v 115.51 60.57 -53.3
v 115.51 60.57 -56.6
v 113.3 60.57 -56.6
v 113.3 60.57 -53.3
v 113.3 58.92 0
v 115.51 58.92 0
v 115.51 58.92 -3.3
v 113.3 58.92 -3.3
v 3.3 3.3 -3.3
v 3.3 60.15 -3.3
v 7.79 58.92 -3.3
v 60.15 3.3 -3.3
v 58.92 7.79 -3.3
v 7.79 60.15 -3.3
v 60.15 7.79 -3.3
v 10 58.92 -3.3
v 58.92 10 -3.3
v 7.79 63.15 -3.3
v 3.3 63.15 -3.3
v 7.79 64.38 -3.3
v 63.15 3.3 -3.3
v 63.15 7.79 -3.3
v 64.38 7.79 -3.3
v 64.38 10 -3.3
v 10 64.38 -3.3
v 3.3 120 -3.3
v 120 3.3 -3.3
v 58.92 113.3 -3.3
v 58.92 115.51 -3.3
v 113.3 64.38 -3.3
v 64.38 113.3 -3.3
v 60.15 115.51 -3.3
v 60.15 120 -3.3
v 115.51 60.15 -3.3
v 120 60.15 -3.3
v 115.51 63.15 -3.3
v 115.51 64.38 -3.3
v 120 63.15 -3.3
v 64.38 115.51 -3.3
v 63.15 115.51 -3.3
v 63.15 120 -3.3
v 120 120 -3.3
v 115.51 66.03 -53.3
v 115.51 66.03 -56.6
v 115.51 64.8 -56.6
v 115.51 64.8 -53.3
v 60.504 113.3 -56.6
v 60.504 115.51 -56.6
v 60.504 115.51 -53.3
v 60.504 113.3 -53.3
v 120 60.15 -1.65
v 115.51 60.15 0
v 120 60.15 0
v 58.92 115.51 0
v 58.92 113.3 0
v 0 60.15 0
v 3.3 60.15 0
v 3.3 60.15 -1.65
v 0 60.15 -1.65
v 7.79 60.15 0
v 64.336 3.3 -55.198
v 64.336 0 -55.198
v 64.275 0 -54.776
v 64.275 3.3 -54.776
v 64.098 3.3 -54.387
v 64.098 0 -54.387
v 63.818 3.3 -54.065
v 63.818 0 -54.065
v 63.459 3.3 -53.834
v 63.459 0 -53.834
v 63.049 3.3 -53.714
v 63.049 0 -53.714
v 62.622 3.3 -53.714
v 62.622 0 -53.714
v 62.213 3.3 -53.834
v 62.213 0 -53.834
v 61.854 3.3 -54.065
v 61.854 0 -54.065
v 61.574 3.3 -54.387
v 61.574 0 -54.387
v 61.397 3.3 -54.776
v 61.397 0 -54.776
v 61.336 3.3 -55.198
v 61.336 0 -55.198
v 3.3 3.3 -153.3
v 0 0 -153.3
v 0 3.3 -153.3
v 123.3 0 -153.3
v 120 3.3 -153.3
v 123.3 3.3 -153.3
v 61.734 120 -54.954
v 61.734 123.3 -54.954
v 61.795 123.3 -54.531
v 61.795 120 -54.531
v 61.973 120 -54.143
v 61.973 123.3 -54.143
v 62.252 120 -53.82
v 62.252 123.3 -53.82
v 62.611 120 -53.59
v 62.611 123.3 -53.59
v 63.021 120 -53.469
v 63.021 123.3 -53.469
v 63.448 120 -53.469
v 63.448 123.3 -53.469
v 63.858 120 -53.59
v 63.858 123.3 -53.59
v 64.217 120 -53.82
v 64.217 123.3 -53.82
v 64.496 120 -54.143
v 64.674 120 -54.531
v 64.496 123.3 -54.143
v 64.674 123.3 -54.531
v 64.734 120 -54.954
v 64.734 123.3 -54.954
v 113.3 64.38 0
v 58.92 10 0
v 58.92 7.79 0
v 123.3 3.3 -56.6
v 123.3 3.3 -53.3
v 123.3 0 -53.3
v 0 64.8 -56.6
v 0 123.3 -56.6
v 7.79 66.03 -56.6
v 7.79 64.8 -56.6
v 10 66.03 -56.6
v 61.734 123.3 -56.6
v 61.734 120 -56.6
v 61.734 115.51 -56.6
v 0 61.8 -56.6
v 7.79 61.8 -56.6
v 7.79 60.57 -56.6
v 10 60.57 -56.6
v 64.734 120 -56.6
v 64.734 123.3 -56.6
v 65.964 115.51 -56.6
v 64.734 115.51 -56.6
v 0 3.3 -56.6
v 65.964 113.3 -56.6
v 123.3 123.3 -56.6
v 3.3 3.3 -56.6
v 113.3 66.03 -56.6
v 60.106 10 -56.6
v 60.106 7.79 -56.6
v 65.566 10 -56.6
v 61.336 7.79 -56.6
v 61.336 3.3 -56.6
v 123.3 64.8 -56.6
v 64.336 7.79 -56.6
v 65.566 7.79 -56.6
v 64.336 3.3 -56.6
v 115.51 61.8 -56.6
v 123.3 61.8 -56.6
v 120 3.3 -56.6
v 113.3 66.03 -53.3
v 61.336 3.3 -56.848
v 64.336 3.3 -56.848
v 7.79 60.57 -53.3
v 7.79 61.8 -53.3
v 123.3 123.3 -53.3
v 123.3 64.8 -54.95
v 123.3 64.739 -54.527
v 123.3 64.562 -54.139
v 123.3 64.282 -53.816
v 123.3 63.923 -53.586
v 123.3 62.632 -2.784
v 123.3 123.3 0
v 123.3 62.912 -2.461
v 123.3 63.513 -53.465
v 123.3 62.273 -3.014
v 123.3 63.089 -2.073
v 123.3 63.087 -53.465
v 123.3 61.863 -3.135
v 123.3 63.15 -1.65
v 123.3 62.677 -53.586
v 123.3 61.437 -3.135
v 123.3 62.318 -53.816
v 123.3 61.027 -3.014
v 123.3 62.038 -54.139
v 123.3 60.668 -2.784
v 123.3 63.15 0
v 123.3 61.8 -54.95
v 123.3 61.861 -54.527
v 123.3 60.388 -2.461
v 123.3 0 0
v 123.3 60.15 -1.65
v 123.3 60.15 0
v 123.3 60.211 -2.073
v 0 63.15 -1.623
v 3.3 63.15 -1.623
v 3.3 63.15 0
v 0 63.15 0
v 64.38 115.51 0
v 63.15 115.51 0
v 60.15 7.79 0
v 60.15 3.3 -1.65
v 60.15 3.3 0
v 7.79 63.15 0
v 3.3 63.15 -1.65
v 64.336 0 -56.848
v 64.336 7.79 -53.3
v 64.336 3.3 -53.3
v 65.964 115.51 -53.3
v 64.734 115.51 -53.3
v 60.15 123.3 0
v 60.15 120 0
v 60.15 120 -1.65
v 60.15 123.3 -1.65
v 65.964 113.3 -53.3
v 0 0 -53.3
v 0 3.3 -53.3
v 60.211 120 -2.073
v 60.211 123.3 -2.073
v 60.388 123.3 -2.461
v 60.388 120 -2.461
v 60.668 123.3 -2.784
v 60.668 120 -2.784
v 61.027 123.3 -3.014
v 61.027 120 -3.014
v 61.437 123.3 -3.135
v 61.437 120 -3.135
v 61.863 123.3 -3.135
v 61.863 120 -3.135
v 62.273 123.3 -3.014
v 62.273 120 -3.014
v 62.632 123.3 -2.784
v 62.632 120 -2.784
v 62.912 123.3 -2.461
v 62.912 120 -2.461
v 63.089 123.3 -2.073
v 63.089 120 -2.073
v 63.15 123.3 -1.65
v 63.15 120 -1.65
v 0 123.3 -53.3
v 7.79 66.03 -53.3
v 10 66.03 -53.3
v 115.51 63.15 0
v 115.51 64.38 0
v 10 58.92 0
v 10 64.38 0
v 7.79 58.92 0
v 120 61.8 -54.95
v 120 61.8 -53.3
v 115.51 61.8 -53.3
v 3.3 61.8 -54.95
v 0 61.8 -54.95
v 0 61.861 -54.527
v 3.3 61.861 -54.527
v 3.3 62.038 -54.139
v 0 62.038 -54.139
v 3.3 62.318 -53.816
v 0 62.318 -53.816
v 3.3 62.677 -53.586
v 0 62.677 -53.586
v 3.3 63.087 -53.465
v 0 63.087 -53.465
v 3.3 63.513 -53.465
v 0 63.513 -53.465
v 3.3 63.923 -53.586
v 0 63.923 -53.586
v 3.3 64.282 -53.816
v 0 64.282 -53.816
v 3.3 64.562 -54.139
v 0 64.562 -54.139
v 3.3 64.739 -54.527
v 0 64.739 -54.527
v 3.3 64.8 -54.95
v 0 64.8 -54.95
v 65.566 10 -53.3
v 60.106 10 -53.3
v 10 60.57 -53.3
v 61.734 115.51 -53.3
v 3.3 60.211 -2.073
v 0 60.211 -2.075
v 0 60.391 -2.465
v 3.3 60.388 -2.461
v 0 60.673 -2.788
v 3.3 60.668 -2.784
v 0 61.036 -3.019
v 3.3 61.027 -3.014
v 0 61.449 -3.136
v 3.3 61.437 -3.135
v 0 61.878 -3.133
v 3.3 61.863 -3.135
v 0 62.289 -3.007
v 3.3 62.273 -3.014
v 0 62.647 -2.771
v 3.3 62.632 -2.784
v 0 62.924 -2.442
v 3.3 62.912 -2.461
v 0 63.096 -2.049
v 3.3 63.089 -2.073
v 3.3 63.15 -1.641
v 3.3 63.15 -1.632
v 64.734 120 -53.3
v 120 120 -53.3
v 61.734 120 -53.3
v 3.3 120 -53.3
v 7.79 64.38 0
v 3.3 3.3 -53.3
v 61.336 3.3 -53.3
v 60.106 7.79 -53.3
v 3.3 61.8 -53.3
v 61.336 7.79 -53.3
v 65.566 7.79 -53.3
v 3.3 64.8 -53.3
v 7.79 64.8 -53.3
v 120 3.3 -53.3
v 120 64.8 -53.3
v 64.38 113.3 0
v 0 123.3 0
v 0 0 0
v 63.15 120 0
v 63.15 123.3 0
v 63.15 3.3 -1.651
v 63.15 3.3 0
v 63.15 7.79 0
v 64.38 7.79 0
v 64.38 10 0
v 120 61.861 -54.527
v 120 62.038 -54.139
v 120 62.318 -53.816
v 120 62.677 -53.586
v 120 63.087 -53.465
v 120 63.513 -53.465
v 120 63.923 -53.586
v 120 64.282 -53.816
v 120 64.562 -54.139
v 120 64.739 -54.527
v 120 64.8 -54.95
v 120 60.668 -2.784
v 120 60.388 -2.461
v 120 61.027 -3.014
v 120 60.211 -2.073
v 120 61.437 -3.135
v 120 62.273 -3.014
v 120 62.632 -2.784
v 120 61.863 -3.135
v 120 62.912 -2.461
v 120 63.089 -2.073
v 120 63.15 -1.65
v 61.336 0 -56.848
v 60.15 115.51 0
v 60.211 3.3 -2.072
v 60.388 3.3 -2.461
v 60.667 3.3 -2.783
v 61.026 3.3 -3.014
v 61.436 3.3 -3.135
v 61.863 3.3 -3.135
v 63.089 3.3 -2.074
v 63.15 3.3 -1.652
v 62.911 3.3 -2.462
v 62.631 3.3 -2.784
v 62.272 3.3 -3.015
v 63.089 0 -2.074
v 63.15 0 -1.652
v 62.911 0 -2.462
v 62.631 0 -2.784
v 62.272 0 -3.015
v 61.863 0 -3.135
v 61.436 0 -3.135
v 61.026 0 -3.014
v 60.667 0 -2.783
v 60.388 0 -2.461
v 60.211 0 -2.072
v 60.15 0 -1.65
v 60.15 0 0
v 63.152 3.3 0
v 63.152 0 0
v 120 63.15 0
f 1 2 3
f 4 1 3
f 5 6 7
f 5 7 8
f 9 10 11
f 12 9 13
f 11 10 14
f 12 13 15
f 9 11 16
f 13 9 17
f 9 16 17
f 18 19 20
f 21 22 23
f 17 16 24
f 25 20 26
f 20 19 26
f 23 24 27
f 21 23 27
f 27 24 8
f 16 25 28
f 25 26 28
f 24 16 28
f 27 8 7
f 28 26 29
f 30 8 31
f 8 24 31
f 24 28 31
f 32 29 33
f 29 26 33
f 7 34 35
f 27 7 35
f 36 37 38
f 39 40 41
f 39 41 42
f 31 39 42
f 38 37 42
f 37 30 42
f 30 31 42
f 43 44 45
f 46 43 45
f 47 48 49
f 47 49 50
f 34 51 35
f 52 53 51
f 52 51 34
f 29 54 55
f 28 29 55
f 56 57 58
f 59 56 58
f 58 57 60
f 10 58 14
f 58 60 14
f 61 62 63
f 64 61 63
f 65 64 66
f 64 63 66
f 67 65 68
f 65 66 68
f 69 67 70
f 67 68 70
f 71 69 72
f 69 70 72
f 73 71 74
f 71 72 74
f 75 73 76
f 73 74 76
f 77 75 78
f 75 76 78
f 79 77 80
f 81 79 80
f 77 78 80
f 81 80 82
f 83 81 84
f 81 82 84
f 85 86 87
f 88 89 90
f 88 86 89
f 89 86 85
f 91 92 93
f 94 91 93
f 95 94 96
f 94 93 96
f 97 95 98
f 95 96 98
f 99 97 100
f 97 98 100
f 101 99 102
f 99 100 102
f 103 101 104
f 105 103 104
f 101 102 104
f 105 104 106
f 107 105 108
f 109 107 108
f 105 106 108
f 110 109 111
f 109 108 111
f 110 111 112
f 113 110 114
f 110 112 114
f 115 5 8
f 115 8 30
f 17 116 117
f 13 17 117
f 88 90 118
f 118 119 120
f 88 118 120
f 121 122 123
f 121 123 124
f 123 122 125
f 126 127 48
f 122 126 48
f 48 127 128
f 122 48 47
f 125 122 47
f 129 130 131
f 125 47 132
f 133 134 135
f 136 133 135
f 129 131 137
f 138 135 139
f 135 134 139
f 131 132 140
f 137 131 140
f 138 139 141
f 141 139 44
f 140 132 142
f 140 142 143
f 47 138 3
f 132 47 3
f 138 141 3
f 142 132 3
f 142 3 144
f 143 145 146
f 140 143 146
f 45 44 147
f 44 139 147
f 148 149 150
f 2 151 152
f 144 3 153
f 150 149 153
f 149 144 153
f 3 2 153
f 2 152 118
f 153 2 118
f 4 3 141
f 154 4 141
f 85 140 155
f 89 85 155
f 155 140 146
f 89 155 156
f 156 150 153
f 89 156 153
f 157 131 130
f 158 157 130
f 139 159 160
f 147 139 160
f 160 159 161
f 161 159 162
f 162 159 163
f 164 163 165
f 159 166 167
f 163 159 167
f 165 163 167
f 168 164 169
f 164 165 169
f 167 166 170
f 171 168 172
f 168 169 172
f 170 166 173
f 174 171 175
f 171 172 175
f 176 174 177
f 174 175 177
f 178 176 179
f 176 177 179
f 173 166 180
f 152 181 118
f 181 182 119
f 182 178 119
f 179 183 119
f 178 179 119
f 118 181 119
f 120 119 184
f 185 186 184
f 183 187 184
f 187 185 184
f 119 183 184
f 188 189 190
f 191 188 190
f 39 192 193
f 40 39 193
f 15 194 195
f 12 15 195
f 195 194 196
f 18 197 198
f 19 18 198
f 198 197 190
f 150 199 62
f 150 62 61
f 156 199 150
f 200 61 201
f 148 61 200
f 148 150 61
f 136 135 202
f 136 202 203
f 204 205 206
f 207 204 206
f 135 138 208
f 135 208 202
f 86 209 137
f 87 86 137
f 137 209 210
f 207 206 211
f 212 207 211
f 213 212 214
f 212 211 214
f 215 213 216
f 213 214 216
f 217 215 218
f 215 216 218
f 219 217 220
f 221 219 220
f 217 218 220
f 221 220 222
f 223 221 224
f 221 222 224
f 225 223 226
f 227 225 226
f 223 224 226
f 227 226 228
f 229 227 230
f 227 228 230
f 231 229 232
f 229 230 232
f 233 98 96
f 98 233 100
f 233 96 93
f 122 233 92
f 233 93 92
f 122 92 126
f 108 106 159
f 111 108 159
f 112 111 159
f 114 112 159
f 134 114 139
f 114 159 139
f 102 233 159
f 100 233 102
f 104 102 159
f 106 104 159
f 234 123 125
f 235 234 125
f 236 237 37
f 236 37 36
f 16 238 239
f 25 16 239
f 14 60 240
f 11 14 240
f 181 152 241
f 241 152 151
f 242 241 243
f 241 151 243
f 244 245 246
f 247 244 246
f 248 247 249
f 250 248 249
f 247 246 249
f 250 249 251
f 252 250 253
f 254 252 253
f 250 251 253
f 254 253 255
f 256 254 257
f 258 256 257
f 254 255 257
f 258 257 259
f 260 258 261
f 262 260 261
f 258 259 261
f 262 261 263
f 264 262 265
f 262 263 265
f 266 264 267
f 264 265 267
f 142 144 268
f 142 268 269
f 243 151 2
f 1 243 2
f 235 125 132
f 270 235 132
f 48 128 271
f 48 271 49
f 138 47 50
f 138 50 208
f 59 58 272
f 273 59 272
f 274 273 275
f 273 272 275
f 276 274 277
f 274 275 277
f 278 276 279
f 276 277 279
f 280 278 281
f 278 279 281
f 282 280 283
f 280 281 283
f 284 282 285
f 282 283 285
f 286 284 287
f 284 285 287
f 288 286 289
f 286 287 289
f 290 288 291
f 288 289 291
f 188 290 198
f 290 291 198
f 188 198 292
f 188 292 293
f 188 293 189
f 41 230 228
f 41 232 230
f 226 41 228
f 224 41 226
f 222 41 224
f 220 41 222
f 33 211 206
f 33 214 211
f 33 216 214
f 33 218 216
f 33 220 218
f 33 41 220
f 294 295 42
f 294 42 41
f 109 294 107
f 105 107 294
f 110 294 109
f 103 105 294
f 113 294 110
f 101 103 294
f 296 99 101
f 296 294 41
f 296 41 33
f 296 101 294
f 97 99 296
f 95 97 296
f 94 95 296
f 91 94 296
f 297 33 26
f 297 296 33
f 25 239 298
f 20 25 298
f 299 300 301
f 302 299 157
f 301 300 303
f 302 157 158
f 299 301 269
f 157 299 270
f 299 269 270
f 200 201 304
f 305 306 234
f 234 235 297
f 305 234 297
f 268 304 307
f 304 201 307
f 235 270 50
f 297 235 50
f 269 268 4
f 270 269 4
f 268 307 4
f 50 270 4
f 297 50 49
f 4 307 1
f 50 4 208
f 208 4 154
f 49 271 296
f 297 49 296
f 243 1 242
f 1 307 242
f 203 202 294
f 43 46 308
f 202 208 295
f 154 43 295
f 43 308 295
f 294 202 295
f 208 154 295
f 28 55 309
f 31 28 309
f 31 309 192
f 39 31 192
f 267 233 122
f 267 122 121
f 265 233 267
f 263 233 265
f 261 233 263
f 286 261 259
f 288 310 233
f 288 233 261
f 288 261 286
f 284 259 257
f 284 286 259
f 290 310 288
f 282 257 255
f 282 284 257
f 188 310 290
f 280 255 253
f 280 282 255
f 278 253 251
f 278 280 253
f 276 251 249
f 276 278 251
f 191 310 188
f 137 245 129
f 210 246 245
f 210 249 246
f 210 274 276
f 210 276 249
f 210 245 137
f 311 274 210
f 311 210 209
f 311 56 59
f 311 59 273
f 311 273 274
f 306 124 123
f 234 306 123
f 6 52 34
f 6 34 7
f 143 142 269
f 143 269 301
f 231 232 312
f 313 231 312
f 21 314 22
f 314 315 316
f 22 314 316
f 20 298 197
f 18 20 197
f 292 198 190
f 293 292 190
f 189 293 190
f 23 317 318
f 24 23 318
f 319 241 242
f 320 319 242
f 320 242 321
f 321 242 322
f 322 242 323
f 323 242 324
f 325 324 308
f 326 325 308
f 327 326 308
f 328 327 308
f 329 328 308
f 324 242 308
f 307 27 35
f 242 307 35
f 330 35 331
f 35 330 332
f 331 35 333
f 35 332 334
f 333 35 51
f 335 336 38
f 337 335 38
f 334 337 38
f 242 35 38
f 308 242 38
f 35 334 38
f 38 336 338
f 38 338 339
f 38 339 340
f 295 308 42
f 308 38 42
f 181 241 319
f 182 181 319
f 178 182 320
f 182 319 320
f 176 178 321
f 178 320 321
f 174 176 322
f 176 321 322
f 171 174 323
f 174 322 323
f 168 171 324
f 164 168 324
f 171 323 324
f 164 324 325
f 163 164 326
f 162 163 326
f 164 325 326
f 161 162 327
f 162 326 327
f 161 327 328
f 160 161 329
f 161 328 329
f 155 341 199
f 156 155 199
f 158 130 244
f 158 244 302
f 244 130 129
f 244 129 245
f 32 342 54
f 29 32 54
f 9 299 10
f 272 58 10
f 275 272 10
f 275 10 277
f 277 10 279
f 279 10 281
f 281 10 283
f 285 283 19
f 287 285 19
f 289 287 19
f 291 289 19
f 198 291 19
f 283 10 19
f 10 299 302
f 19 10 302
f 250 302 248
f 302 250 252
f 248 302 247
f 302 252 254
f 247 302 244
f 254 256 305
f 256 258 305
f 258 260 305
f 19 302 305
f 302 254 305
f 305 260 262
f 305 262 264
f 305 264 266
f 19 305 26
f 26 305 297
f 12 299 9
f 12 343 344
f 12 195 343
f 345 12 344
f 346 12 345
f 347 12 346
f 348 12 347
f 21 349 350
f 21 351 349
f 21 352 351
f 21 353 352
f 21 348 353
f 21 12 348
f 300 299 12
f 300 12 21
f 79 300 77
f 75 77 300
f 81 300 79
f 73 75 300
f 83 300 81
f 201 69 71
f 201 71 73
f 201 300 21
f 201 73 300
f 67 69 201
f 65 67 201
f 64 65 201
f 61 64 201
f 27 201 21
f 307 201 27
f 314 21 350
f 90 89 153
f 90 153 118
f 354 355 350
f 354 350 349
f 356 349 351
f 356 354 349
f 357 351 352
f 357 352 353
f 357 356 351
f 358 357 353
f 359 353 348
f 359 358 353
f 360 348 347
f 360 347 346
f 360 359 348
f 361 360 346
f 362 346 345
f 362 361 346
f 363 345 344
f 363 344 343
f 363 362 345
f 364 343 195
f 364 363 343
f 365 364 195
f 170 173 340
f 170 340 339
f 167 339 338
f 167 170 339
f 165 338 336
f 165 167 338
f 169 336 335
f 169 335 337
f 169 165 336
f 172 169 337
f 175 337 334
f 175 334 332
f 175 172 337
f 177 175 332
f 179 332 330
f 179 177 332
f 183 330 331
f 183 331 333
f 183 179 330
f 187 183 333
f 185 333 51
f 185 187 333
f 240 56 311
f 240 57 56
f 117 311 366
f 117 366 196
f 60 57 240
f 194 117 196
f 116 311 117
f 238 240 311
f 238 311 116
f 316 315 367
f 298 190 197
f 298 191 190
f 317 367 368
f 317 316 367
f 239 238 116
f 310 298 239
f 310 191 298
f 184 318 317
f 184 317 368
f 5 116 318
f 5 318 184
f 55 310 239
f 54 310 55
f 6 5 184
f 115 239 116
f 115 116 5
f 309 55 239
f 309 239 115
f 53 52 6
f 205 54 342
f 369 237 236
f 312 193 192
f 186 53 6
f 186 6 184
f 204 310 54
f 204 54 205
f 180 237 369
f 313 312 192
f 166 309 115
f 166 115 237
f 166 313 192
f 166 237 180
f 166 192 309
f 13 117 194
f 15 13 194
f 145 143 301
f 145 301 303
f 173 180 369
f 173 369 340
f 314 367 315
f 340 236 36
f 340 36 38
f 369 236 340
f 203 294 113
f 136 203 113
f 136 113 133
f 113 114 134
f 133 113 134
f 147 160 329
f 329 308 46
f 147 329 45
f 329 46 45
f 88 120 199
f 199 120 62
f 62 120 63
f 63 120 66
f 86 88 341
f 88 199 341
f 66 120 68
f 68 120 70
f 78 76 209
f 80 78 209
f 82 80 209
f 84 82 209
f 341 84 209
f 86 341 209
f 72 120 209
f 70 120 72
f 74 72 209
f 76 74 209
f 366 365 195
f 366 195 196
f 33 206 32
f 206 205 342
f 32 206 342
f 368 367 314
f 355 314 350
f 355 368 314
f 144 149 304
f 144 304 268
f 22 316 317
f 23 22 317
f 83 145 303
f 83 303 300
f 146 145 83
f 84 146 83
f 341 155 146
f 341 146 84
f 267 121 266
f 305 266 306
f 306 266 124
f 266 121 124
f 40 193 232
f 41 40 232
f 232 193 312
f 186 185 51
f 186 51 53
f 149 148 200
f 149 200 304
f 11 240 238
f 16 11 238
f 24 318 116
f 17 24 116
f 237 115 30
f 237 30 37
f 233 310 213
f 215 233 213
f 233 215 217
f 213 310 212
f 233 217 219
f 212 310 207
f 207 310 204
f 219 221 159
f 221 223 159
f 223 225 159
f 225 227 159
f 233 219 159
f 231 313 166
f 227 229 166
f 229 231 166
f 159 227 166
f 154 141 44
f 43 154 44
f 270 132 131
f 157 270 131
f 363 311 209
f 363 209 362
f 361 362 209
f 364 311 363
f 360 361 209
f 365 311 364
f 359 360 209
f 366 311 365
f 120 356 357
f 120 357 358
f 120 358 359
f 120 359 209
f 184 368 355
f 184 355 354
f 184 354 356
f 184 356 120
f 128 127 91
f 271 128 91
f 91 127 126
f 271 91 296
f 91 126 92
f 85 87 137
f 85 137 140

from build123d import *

# Parameters (mm, degrees)
SCHIZZO2_W                   = 123.3
SCHIZZO2_H                   = 123.3
ESTRUSIONE_ESTRUSIONE2_DEPTH = 53.3
SVUOTA1_T                    = -3.3
TAGLIO_ESTRUSIONE2_DEPTH     = 3.3
TAGLIO_ESTRUSIONE6_DEPTH     = 3.3
TAGLIO_ESTRUSIONE7_START     = 3.3
TAGLIO_ESTRUSIONE7_DEPTH     = 3.3
TAGLIO_ESTRUSIONE8_DEPTH     = 3.3
TAGLIO_ESTRUSIONE9_START     = -3.3
TAGLIO_ESTRUSIONE9_DEPTH     = 3.3
ESTRUSIONE_ESTRUSIONE5_DEPTH = 100
ESTRUSIONE_ESTRUSIONE7_DEPTH = 123.3
TAGLIO_ESTRUSIONE19_DEPTH    = 3.3
TAGLIO_ESTRUSIONE20_DEPTH    = 3.3
TAGLIO_ESTRUSIONE21_START    = -3.3
TAGLIO_ESTRUSIONE21_DEPTH    = 3.3
TAGLIO_ESTRUSIONE22_DEPTH    = 3.3
TAGLIO_ESTRUSIONE23_DEPTH    = 3.3
TAGLIO_ESTRUSIONE24_DEPTH    = 3.3


with BuildPart() as part:
    # Schizzo2 → Estrusione-Estrusione2 (new body)
    with BuildSketch(Plane.XY):
        with Locations((61.65, 61.65)):
            Rectangle(SCHIZZO2_W, SCHIZZO2_H)
    extrude(amount=-ESTRUSIONE_ESTRUSIONE2_DEPTH)

    # Svuota1
    svuota1_openings = [part.faces().sort_by_distance(p)[0] for p in [
        (61.65, 61.65, -53.3),
    ]]
    offset(amount=SVUOTA1_T, openings=svuota1_openings, kind=Kind.INTERSECTION)

    # Schizzo3D1 → Taglio-Estrusione2 (cut)
    with BuildSketch(Plane(origin=(123.3, 60.15, -1.65), x_dir=(0, 0.8762159086766463, 0.48191874977215726), z_dir=(1, 0, 0))):
        with BuildLine():
            Line((0, 0), (0.795165937, 1.445756249))
            Line((0.795165937, 1.445756249), (3.423813663, 0))
            Line((3.423813663, 0), (2.628647726, -1.445756249))
            ThreePointArc((2.628647726, -1.445756249), (0.591445738, -2.037201988), (0, 0))
        make_face()
    extrude(amount=-TAGLIO_ESTRUSIONE2_DEPTH, mode=Mode.SUBTRACT)

    # Schizzo6 → Taglio-Estrusione6 (cut)
    with BuildSketch(Plane.XY):
        Polygon((120, 60.15), (115.51, 60.15), (115.51, 58.92), (113.3, 58.92), (113.3, 64.38), (115.51, 64.38), (115.51, 63.15), (120, 63.15), align=None)
        Polygon((3.3, 63.15), (3.3, 60.15), (7.79, 60.15), (7.79, 58.92), (10, 58.92), (10, 64.38), (7.79, 64.38), (7.79, 63.15), align=None)
        Polygon((60.15, 3.3), (63.15, 3.3), (63.15, 7.79), (64.38, 7.79), (64.38, 10), (58.92, 10), (58.92, 7.79), (60.15, 7.79), align=None)
        Polygon((63.15, 120), (60.15, 120), (60.15, 115.51), (58.92, 115.51), (58.92, 113.3), (64.38, 113.3), (64.38, 115.51), (63.15, 115.51), align=None)
    extrude(amount=-TAGLIO_ESTRUSIONE6_DEPTH, mode=Mode.SUBTRACT)

    # Schizzo3D6 → Taglio-Estrusione7 (cut)
    with BuildSketch(Plane(origin=(0, 61.65, 0), x_dir=(0, -0.6726727939963129, -0.7399400733959435), z_dir=(1, 0, 0)).offset(TAGLIO_ESTRUSIONE7_START)):
        with BuildLine():
            Line((0, 0), (1.009009191, -1.10991011))
            Line((1.009009191, -1.10991011), (2.229910312, 0))
            ThreePointArc((2.229910312, 0), (2.321673153, 2.128880637), (0.192052014, 2.201454665))
            Line((0.192052014, 2.201454665), (-1.008845302, 1.109729832))
            Line((-1.008845302, 1.109729832), (0, 0))
        make_face()
    extrude(amount=-TAGLIO_ESTRUSIONE7_DEPTH, mode=Mode.SUBTRACT)

    # Schizzo3D7 → Taglio-Estrusione8 (cut)
    with BuildSketch(Plane(origin=(60.15, 0, 0), x_dir=(0.8760258326495893, 2.026216235651821e-15, -0.48226418126437076), z_dir=(0, -1, 0))):
        with BuildLine():
            Line((0, 0), (2.629562684, 1.447610159))
            Line((2.629562684, 1.447610159), (3.424555643, 0))
            ThreePointArc((3.424555643, 0), (2.832496055, -2.036456397), (0.795735899, -1.445442624))
            Line((0.795735899, -1.445442624), (0, 0))
        make_face()
    extrude(amount=-TAGLIO_ESTRUSIONE8_DEPTH, mode=Mode.SUBTRACT)

    # Schizzo3D8 → Taglio-Estrusione9 (cut)
    with BuildSketch(Plane(origin=(63.15, 123.3, 0), x_dir=(-0.8762159086766472, 0, -0.48191874977215554), z_dir=(0, 1, 0)).offset(TAGLIO_ESTRUSIONE9_START)):
        with BuildLine():
            Line((0, 0), (2.628647726, 1.445756249))
            Line((2.628647726, 1.445756249), (3.423813663, 0))
            ThreePointArc((3.423813663, 0), (2.832367925, -2.037201988), (0.795165937, -1.445756249))
            Line((0.795165937, -1.445756249), (0, 0))
        make_face()
    extrude(amount=TAGLIO_ESTRUSIONE9_DEPTH, mode=Mode.SUBTRACT)

    # Schizzo3D9 → Estrusione-Estrusione5 (add)
    with BuildSketch(Plane(origin=(120, 3.3, -53.3), x_dir=(-0.9996220893327035, -0.02748960745664935, 0), z_dir=(0, 0, 1))):
        Polygon((0, 0), (-3.298752895, 0.090715705), (-3.20803719, 3.389468599), (120.045366425, 0), (119.95465072, -3.298752895), (116.655897825, -3.20803719), align=None)
    extrude(amount=-ESTRUSIONE_ESTRUSIONE5_DEPTH)

    # Schizzo3D10 → Estrusione-Estrusione7 (add)
    with BuildSketch(Plane(origin=(123.3, 123.3, -53.3), x_dir=(0, -0.9996220893327035, -0.027489607456649322), z_dir=(-1, 0, 0))):
        Polygon((0, 0), (0.090715705, -3.298752895), (120.045366425, 0), (119.95465072, 3.298752895), align=None)
    extrude(amount=ESTRUSIONE_ESTRUSIONE7_DEPTH)

    # Schizzo14 → Taglio-Estrusione19 (cut)
    with BuildSketch(Plane.ZY):
        with BuildLine():
            Line((-56.6, 64.8), (-56.6, 61.8))
            Line((-56.6, 61.8), (-54.95, 61.8))
            ThreePointArc((-54.95, 61.8), (-53.45, 63.3), (-54.95, 64.8))
            Line((-54.95, 64.8), (-56.6, 64.8))
        make_face()
    extrude(amount=-TAGLIO_ESTRUSIONE19_DEPTH, mode=Mode.SUBTRACT)

    # Schizzo21 → Taglio-Estrusione20 (cut)
    with BuildSketch(Plane(origin=(0, 0, 0), x_dir=(-1, 0, 0), z_dir=(0, -1, 0))):
        with BuildLine():
            Line((-64.335889046, 56.848416793), (-64.335889046, 55.198416793))
            ThreePointArc((-64.335889046, 55.198416793), (-62.835889046, 53.698416793), (-61.335889046, 55.198416793))
            Line((-61.335889046, 55.198416793), (-61.335889046, 56.848416793))
            Line((-61.335889046, 56.848416793), (-64.335889046, 56.848416793))
        make_face()
    extrude(amount=-TAGLIO_ESTRUSIONE20_DEPTH, mode=Mode.SUBTRACT)

    # Schizzo17 → Taglio-Estrusione21 (cut)
    with BuildSketch(Plane(origin=(123.3, 0, 0), x_dir=(0, 0, -1), z_dir=(1, 0, 0)).offset(TAGLIO_ESTRUSIONE21_START)):
        with BuildLine():
            Line((56.6, 64.8), (56.6, 61.8))
            Line((56.6, 61.8), (54.95, 61.8))
            ThreePointArc((54.95, 61.8), (53.45, 63.3), (54.95, 64.8))
            Line((54.95, 64.8), (56.6, 64.8))
        make_face()
    extrude(amount=TAGLIO_ESTRUSIONE21_DEPTH, mode=Mode.SUBTRACT)

    # Schizzo24 → Taglio-Estrusione22 (cut)
    with BuildSketch(Plane(origin=(0, 123.3, 0), x_dir=(1, 0, 0), z_dir=(0, 1, 0))):
        with BuildLine():
            Line((61.734441738, 56.603992056), (61.734441738, 54.953992056))
            ThreePointArc((61.734441738, 54.953992056), (63.234441738, 53.453992056), (64.734441738, 54.953992056))
            Line((64.734441738, 54.953992056), (64.734441738, 56.603992056))
            Line((64.734441738, 56.603992056), (61.734441738, 56.603992056))
        make_face()
    extrude(amount=-TAGLIO_ESTRUSIONE22_DEPTH, mode=Mode.SUBTRACT)

    # Schizzo26 → Taglio-Estrusione23 (cut)
    with BuildSketch(Plane(origin=(0, 0, -56.6), x_dir=(-1, 0, 0), z_dir=(0, 0, -1))):
        Polygon((-61.734441738, 120), (-61.734441738, 115.51), (-60.504441738, 115.51), (-60.504441738, 113.3), (-65.964441738, 113.3), (-65.964441738, 115.51), (-64.734441738, 115.51), (-64.734441738, 120), align=None)
    extrude(amount=-TAGLIO_ESTRUSIONE23_DEPTH, mode=Mode.SUBTRACT)

    # Schizzo28 → Taglio-Estrusione24 (cut)
    with BuildSketch(Plane(origin=(0, 0, -56.6), x_dir=(-1, 0, 0), z_dir=(0, 0, -1))):
        Polygon((-120, 61.8), (-115.51, 61.8), (-115.51, 60.57), (-113.3, 60.57), (-113.3, 66.03), (-115.51, 66.03), (-115.51, 64.8), (-120, 64.8), align=None)
        Polygon((-3.3, 64.8), (-7.79, 64.8), (-7.79, 66.03), (-10, 66.03), (-10, 60.57), (-7.79, 60.57), (-7.79, 61.8), (-3.3, 61.8), align=None)
        Polygon((-64.335889046, 3.3), (-64.335889046, 7.79), (-65.565889046, 7.79), (-65.565889046, 10), (-60.105889046, 10), (-60.105889046, 7.79), (-61.335889046, 7.79), (-61.335889046, 3.3), align=None)
    extrude(amount=-TAGLIO_ESTRUSIONE24_DEPTH, mode=Mode.SUBTRACT)


solid = part.part
